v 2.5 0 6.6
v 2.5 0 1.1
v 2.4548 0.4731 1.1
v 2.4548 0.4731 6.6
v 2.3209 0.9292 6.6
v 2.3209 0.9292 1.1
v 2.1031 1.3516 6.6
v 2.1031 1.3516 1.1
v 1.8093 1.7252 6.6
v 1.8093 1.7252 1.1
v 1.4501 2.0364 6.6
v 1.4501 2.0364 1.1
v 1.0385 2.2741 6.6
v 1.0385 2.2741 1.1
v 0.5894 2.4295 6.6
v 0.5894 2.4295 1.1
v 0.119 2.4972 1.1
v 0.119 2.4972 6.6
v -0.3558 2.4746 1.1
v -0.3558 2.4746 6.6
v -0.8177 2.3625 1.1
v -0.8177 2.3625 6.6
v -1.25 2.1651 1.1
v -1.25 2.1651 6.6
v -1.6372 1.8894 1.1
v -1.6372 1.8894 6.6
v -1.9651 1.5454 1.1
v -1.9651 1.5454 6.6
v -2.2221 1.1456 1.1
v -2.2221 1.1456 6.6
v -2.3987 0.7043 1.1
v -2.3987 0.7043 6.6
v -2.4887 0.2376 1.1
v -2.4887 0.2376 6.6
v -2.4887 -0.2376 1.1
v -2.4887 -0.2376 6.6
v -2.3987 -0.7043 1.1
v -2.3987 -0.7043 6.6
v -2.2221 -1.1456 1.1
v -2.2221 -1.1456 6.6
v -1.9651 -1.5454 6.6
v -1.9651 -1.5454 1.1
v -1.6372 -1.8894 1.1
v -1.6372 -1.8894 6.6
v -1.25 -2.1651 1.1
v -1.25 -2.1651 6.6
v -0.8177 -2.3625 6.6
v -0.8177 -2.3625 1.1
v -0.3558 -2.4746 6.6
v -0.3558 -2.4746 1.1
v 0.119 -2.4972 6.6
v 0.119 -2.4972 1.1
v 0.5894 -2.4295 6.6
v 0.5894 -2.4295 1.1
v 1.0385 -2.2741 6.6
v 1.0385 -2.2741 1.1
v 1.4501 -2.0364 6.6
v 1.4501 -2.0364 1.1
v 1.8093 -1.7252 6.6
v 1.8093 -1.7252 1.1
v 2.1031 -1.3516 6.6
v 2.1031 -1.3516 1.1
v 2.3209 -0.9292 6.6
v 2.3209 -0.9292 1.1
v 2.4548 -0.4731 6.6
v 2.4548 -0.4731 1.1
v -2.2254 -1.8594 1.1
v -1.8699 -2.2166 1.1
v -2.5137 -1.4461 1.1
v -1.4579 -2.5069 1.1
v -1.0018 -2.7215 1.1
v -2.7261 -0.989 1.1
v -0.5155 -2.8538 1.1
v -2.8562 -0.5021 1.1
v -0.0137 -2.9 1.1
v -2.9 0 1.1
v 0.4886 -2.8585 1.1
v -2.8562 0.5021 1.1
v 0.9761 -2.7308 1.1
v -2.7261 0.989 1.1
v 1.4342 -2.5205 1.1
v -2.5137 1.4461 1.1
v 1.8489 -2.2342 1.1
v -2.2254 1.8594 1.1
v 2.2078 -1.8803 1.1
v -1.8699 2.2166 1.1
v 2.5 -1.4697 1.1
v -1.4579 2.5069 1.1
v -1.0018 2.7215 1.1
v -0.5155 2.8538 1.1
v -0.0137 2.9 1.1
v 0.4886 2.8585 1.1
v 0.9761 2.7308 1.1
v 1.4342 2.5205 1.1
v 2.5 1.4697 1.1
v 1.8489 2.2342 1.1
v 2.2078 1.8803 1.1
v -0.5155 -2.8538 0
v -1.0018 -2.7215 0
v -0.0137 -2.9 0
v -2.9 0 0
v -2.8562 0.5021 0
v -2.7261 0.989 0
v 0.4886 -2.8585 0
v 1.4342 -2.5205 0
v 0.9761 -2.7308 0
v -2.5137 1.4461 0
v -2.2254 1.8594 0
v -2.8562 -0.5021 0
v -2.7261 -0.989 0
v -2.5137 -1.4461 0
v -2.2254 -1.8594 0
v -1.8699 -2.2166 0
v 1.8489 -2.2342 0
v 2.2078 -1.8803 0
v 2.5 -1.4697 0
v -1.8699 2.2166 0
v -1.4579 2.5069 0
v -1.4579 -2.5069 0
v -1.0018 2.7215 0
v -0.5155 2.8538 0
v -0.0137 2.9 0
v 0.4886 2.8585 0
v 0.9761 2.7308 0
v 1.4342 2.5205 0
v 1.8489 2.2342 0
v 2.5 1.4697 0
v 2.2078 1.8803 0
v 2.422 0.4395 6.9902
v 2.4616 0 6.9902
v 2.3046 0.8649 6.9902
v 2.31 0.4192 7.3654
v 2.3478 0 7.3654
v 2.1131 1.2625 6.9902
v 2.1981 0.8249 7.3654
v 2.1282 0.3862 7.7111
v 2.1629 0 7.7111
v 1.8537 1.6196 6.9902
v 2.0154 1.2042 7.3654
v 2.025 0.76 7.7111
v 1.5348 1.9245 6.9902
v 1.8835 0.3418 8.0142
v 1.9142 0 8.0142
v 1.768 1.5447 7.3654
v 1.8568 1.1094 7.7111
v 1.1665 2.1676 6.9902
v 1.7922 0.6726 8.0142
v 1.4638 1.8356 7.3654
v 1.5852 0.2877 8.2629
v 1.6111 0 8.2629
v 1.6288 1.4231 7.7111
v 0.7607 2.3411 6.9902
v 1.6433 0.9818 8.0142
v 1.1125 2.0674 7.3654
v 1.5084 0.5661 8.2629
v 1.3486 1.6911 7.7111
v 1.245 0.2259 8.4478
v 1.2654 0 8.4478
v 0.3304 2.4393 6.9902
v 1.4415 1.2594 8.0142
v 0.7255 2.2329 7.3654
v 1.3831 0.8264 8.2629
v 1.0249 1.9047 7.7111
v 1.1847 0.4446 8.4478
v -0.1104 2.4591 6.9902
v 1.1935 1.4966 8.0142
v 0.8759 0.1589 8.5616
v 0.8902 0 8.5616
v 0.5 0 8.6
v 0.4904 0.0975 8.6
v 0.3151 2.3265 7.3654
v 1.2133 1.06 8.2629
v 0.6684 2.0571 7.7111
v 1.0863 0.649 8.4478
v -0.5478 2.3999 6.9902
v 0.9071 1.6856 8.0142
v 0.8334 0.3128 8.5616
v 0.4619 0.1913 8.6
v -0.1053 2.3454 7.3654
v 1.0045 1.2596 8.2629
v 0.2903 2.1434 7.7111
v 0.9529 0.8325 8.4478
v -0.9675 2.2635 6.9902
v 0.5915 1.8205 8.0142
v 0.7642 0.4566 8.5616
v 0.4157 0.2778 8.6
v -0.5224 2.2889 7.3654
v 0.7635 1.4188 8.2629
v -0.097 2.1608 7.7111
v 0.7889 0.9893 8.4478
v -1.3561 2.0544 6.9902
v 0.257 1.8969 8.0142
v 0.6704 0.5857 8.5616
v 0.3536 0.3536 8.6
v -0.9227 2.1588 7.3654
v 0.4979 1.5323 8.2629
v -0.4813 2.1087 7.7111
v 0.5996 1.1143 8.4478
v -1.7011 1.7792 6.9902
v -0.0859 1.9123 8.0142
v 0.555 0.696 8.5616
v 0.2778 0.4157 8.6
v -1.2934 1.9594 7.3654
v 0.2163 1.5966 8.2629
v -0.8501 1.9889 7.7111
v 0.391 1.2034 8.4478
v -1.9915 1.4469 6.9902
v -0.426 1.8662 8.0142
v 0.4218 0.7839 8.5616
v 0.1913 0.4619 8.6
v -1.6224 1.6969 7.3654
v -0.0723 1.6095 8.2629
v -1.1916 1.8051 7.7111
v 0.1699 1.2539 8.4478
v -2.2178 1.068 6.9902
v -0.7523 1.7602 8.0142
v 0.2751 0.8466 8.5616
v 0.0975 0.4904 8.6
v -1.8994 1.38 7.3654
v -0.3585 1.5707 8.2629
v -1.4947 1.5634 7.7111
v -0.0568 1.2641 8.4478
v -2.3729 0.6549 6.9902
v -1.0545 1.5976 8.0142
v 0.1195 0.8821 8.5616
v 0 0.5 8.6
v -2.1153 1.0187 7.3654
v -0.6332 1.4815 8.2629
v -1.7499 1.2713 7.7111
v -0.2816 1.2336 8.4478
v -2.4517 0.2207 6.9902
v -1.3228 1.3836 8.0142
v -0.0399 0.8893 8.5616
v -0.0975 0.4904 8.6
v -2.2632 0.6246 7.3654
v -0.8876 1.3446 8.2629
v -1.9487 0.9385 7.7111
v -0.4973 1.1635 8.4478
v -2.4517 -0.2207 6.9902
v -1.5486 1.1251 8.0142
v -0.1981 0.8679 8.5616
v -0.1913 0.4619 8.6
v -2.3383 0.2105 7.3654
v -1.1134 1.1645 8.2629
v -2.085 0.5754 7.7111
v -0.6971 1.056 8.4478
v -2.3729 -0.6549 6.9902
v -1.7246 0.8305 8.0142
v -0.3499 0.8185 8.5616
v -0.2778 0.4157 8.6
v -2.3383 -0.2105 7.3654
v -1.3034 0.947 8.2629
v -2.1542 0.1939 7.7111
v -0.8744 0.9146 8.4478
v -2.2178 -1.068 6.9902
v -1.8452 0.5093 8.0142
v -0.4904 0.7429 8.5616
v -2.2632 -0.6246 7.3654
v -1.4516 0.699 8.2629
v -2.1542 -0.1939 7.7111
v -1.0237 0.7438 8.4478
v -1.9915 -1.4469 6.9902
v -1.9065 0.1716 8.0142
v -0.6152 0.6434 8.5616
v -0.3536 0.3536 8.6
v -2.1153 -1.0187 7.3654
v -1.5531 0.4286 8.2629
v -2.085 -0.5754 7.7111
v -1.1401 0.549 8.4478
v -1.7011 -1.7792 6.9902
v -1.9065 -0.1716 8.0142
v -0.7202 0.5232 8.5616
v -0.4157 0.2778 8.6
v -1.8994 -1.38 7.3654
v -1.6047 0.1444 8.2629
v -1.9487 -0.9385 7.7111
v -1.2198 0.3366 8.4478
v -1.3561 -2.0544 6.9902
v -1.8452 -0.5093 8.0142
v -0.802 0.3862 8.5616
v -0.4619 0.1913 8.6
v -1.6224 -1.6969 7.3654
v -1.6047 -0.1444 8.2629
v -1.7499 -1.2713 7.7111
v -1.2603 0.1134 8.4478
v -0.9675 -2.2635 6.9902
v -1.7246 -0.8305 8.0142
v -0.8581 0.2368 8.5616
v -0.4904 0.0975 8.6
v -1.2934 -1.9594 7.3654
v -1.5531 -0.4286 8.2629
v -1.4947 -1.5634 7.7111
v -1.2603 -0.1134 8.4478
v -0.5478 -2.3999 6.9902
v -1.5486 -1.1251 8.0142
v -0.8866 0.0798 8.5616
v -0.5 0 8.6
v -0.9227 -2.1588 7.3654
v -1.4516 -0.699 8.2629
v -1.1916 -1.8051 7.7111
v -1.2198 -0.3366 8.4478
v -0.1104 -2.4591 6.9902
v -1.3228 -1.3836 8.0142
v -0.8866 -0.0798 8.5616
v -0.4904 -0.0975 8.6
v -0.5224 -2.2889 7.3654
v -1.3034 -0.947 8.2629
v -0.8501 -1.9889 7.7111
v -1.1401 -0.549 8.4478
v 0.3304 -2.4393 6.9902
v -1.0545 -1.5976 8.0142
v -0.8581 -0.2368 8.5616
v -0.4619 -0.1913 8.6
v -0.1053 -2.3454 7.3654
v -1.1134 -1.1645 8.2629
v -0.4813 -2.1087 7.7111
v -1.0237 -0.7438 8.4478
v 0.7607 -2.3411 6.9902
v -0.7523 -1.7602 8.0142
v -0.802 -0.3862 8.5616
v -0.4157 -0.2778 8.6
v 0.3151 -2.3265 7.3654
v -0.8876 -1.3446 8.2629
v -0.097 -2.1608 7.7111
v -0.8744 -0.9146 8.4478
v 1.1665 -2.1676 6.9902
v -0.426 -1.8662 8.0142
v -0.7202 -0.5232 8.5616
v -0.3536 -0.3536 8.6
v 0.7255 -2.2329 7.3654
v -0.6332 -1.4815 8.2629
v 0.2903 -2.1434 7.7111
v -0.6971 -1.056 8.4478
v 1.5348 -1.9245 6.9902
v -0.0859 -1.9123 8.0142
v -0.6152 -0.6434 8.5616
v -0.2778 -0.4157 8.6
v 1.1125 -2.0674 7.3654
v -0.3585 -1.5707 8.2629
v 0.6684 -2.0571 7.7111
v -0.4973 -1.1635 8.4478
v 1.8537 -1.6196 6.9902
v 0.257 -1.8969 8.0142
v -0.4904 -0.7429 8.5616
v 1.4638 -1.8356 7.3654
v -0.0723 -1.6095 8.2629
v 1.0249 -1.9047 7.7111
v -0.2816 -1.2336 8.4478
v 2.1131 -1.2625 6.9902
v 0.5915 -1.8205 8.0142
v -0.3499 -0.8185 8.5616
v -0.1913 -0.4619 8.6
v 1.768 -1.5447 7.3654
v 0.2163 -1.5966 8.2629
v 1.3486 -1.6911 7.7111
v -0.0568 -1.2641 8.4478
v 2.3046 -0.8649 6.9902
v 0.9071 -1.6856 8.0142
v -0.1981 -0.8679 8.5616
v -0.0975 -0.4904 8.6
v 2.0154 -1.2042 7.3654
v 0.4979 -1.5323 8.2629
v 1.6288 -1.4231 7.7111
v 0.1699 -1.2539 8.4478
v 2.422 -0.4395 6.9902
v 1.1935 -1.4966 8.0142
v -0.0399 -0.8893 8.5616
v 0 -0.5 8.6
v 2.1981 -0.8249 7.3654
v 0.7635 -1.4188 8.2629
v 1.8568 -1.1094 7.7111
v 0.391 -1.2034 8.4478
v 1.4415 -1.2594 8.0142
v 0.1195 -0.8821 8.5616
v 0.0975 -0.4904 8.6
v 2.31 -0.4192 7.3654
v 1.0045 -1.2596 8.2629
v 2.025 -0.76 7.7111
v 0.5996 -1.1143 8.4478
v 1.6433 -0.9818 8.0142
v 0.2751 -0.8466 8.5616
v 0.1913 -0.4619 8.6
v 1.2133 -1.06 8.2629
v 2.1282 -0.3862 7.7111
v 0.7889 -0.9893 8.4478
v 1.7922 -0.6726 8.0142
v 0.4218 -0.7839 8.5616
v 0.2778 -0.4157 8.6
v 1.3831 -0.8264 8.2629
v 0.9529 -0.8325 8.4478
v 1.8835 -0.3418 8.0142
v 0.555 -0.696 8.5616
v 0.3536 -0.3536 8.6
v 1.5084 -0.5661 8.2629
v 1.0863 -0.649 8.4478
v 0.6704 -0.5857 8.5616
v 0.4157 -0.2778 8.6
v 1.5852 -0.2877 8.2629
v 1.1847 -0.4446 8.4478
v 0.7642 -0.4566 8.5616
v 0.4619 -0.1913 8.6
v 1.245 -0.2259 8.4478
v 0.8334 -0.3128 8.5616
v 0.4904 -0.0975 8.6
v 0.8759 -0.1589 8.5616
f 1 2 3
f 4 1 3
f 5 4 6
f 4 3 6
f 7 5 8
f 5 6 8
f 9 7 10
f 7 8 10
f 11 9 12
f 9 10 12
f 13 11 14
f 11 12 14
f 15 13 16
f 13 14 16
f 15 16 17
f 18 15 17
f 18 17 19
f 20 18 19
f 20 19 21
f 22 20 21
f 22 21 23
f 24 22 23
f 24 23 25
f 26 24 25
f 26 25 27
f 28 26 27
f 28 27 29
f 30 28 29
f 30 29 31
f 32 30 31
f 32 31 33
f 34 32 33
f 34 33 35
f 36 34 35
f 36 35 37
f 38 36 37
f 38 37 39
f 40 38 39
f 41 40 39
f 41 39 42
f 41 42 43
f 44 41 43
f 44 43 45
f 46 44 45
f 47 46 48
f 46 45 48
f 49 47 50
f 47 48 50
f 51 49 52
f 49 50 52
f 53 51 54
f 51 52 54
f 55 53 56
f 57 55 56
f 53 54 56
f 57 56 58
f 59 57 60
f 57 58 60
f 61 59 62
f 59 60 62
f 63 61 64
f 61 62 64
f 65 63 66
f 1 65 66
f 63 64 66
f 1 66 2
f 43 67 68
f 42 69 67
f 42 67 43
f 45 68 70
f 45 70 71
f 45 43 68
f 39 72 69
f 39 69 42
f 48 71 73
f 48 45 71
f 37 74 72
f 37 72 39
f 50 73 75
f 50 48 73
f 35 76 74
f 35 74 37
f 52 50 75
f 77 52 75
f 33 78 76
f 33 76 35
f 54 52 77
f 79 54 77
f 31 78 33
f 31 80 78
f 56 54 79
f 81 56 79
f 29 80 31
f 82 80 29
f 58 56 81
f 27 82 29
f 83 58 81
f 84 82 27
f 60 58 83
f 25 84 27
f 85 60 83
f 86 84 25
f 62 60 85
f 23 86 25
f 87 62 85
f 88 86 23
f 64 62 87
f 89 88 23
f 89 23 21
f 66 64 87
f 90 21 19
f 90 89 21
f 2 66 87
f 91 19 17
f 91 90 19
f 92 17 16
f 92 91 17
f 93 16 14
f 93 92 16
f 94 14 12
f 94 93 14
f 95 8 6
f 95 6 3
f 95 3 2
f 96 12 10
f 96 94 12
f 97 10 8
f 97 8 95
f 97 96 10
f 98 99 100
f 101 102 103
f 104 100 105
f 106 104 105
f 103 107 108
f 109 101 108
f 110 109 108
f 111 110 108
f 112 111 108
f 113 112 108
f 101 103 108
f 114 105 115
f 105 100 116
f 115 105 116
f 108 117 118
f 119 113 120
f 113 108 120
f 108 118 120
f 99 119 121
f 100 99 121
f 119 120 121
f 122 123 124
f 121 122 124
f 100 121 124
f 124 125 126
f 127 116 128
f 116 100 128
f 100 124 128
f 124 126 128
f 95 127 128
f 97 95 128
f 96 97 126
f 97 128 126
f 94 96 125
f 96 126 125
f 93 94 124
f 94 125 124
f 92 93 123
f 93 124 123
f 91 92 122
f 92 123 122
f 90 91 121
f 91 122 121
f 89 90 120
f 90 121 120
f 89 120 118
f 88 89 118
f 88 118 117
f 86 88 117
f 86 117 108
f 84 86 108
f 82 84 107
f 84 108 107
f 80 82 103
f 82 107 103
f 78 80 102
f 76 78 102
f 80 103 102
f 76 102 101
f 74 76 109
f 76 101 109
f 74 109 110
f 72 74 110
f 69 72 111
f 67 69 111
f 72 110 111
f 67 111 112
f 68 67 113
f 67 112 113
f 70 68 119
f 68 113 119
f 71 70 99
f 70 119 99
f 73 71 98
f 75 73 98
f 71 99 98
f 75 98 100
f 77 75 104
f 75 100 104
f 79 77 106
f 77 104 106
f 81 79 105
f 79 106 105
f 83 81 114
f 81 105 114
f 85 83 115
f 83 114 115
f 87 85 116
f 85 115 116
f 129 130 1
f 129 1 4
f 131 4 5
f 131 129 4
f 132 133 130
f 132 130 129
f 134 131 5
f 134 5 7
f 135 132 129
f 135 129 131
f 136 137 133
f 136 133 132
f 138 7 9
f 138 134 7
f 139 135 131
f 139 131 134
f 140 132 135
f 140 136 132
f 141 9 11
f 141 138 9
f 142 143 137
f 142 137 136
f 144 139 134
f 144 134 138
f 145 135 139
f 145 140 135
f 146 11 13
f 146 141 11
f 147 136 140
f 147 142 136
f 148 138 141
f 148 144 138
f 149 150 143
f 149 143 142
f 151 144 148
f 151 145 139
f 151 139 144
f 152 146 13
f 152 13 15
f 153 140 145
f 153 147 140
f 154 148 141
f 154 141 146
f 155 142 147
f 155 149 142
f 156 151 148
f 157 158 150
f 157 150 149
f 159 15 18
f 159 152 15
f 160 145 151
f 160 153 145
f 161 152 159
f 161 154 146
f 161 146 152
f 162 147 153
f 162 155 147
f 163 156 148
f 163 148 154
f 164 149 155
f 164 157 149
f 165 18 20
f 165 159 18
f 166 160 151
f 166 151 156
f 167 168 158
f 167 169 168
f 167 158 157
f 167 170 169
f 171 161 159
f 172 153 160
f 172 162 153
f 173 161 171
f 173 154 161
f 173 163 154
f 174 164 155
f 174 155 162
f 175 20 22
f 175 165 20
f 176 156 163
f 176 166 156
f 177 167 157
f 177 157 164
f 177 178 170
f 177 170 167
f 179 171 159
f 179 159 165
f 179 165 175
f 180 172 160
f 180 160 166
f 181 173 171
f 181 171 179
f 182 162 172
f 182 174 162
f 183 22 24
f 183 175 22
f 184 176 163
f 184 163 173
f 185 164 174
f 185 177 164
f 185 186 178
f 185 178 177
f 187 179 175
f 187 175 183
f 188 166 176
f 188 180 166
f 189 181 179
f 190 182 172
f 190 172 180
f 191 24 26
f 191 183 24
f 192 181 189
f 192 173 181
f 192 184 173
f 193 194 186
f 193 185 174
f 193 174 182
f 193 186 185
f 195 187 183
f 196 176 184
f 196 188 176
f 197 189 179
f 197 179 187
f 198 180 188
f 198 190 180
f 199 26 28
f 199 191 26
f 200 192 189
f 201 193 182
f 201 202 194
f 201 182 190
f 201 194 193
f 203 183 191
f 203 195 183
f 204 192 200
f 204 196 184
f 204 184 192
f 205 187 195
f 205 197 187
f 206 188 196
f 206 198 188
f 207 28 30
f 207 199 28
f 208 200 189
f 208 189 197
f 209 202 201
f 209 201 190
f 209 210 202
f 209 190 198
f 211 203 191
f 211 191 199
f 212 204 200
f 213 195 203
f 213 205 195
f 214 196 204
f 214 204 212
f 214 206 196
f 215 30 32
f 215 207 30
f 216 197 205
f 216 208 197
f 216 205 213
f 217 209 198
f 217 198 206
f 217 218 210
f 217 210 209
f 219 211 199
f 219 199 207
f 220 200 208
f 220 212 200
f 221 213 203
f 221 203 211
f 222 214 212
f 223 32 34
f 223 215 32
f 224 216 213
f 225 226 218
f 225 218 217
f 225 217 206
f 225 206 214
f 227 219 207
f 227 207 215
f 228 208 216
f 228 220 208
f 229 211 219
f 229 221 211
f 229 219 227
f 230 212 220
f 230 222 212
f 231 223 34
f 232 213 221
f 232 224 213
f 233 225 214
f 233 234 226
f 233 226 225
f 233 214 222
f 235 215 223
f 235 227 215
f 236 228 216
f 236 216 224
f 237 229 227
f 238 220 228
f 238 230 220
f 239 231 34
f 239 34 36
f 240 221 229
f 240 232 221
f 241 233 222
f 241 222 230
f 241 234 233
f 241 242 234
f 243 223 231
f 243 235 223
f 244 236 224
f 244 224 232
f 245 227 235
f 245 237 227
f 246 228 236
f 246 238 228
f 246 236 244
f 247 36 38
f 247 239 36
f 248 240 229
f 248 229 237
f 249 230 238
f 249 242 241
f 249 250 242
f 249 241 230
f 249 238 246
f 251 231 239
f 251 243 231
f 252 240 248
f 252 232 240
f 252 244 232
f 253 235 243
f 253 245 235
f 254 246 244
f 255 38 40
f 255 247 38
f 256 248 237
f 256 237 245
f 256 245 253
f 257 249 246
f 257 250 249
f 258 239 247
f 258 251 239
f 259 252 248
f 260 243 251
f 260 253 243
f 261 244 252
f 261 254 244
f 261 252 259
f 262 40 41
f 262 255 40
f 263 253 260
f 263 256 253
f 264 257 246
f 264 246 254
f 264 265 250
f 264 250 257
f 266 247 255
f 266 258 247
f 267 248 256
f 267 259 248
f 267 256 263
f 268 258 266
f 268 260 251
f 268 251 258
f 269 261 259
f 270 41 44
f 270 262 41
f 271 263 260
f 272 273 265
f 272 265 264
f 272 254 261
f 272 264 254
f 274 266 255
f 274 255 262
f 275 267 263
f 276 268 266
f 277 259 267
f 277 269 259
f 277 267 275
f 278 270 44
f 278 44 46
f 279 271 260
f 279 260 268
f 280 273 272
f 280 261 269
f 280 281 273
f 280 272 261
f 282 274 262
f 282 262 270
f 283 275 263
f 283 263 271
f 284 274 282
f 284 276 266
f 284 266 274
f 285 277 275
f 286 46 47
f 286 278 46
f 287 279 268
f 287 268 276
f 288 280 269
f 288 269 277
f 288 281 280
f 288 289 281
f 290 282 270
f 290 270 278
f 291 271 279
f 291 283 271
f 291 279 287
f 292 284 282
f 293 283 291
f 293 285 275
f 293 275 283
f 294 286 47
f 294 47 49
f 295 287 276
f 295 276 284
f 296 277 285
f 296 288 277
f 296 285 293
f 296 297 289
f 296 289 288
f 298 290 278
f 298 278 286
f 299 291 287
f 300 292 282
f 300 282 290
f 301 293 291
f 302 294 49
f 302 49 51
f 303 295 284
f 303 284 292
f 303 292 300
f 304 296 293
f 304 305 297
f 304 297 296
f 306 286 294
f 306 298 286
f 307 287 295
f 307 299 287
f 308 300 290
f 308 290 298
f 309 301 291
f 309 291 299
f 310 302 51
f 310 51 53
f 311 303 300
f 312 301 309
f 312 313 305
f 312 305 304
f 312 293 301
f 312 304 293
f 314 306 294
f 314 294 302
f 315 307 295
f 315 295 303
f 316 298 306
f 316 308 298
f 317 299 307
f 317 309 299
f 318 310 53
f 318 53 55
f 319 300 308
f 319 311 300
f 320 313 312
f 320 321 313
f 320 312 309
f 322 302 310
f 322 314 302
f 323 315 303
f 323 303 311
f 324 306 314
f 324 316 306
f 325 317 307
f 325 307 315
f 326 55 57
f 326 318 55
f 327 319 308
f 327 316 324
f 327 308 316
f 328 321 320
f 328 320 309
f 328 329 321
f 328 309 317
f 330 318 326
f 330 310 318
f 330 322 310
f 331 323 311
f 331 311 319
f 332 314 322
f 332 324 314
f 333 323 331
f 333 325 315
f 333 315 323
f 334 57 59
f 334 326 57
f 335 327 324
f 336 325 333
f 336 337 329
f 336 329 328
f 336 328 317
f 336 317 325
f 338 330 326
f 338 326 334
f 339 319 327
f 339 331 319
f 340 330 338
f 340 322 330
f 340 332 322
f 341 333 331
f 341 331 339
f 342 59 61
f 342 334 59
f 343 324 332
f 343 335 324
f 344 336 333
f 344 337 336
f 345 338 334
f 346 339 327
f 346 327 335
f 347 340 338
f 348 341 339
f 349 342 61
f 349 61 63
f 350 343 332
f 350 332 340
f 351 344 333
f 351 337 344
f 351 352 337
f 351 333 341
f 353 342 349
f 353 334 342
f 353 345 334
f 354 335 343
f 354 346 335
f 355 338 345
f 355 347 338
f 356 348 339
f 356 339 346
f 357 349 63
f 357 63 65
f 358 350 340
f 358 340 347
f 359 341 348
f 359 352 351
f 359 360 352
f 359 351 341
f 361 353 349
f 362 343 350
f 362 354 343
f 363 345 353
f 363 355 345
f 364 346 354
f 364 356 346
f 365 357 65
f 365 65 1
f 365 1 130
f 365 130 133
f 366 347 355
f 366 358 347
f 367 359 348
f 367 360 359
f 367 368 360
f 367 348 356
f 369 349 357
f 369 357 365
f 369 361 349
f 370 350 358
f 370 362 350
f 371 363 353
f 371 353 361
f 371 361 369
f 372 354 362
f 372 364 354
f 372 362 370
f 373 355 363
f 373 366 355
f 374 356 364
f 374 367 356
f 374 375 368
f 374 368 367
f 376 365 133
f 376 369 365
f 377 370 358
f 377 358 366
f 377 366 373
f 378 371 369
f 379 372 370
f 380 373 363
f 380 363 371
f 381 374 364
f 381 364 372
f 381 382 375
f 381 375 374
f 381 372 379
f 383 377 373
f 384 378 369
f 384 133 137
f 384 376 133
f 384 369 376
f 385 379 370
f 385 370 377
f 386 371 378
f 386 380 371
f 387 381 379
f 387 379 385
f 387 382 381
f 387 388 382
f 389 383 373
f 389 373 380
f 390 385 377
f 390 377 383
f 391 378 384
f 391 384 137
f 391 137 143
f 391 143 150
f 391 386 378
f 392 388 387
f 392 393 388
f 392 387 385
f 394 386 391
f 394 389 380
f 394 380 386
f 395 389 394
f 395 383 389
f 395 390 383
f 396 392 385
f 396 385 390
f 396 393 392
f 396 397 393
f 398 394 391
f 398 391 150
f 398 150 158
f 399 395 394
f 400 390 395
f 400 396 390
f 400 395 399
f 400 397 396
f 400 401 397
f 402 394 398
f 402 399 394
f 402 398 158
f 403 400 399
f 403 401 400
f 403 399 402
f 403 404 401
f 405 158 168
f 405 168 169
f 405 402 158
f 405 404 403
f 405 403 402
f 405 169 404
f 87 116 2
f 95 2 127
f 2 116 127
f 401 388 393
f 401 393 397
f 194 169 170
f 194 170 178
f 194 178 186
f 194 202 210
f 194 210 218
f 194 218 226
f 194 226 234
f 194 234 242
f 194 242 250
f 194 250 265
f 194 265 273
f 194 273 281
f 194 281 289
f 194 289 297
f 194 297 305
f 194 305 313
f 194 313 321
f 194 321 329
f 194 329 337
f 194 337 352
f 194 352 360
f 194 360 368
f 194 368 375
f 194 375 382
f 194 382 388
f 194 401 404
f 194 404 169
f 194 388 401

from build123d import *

# Parameters (mm, degrees)
F2_R     = 2.5
F0_DEPTH = 8.6
F3_DEPTH = 1.1
F4_R     = 2


with BuildPart() as f0:
    # F2 (on Top) → F0 (new body)
    with BuildSketch(Plane.XY):
        Circle(F2_R)
    extrude(amount=F0_DEPTH)

    # F1 (on Top) → F3 (join)
    with BuildSketch(Plane.XY):
        with BuildLine():
            Line((2.5, -1.469694), (2.5, 1.469694))
            ThreePointArc((2.5, 1.469694), (-2.9, 0), (2.5, -1.469694))
        make_face()
    extrude(amount=F3_DEPTH)

    # F4
    f4_edges = [f0.edges().sort_by_distance(p)[0] for p in [
        (-2.5, 0, 8.6),
    ]]
    fillet(f4_edges, radius=F4_R)


solid = f0.part
